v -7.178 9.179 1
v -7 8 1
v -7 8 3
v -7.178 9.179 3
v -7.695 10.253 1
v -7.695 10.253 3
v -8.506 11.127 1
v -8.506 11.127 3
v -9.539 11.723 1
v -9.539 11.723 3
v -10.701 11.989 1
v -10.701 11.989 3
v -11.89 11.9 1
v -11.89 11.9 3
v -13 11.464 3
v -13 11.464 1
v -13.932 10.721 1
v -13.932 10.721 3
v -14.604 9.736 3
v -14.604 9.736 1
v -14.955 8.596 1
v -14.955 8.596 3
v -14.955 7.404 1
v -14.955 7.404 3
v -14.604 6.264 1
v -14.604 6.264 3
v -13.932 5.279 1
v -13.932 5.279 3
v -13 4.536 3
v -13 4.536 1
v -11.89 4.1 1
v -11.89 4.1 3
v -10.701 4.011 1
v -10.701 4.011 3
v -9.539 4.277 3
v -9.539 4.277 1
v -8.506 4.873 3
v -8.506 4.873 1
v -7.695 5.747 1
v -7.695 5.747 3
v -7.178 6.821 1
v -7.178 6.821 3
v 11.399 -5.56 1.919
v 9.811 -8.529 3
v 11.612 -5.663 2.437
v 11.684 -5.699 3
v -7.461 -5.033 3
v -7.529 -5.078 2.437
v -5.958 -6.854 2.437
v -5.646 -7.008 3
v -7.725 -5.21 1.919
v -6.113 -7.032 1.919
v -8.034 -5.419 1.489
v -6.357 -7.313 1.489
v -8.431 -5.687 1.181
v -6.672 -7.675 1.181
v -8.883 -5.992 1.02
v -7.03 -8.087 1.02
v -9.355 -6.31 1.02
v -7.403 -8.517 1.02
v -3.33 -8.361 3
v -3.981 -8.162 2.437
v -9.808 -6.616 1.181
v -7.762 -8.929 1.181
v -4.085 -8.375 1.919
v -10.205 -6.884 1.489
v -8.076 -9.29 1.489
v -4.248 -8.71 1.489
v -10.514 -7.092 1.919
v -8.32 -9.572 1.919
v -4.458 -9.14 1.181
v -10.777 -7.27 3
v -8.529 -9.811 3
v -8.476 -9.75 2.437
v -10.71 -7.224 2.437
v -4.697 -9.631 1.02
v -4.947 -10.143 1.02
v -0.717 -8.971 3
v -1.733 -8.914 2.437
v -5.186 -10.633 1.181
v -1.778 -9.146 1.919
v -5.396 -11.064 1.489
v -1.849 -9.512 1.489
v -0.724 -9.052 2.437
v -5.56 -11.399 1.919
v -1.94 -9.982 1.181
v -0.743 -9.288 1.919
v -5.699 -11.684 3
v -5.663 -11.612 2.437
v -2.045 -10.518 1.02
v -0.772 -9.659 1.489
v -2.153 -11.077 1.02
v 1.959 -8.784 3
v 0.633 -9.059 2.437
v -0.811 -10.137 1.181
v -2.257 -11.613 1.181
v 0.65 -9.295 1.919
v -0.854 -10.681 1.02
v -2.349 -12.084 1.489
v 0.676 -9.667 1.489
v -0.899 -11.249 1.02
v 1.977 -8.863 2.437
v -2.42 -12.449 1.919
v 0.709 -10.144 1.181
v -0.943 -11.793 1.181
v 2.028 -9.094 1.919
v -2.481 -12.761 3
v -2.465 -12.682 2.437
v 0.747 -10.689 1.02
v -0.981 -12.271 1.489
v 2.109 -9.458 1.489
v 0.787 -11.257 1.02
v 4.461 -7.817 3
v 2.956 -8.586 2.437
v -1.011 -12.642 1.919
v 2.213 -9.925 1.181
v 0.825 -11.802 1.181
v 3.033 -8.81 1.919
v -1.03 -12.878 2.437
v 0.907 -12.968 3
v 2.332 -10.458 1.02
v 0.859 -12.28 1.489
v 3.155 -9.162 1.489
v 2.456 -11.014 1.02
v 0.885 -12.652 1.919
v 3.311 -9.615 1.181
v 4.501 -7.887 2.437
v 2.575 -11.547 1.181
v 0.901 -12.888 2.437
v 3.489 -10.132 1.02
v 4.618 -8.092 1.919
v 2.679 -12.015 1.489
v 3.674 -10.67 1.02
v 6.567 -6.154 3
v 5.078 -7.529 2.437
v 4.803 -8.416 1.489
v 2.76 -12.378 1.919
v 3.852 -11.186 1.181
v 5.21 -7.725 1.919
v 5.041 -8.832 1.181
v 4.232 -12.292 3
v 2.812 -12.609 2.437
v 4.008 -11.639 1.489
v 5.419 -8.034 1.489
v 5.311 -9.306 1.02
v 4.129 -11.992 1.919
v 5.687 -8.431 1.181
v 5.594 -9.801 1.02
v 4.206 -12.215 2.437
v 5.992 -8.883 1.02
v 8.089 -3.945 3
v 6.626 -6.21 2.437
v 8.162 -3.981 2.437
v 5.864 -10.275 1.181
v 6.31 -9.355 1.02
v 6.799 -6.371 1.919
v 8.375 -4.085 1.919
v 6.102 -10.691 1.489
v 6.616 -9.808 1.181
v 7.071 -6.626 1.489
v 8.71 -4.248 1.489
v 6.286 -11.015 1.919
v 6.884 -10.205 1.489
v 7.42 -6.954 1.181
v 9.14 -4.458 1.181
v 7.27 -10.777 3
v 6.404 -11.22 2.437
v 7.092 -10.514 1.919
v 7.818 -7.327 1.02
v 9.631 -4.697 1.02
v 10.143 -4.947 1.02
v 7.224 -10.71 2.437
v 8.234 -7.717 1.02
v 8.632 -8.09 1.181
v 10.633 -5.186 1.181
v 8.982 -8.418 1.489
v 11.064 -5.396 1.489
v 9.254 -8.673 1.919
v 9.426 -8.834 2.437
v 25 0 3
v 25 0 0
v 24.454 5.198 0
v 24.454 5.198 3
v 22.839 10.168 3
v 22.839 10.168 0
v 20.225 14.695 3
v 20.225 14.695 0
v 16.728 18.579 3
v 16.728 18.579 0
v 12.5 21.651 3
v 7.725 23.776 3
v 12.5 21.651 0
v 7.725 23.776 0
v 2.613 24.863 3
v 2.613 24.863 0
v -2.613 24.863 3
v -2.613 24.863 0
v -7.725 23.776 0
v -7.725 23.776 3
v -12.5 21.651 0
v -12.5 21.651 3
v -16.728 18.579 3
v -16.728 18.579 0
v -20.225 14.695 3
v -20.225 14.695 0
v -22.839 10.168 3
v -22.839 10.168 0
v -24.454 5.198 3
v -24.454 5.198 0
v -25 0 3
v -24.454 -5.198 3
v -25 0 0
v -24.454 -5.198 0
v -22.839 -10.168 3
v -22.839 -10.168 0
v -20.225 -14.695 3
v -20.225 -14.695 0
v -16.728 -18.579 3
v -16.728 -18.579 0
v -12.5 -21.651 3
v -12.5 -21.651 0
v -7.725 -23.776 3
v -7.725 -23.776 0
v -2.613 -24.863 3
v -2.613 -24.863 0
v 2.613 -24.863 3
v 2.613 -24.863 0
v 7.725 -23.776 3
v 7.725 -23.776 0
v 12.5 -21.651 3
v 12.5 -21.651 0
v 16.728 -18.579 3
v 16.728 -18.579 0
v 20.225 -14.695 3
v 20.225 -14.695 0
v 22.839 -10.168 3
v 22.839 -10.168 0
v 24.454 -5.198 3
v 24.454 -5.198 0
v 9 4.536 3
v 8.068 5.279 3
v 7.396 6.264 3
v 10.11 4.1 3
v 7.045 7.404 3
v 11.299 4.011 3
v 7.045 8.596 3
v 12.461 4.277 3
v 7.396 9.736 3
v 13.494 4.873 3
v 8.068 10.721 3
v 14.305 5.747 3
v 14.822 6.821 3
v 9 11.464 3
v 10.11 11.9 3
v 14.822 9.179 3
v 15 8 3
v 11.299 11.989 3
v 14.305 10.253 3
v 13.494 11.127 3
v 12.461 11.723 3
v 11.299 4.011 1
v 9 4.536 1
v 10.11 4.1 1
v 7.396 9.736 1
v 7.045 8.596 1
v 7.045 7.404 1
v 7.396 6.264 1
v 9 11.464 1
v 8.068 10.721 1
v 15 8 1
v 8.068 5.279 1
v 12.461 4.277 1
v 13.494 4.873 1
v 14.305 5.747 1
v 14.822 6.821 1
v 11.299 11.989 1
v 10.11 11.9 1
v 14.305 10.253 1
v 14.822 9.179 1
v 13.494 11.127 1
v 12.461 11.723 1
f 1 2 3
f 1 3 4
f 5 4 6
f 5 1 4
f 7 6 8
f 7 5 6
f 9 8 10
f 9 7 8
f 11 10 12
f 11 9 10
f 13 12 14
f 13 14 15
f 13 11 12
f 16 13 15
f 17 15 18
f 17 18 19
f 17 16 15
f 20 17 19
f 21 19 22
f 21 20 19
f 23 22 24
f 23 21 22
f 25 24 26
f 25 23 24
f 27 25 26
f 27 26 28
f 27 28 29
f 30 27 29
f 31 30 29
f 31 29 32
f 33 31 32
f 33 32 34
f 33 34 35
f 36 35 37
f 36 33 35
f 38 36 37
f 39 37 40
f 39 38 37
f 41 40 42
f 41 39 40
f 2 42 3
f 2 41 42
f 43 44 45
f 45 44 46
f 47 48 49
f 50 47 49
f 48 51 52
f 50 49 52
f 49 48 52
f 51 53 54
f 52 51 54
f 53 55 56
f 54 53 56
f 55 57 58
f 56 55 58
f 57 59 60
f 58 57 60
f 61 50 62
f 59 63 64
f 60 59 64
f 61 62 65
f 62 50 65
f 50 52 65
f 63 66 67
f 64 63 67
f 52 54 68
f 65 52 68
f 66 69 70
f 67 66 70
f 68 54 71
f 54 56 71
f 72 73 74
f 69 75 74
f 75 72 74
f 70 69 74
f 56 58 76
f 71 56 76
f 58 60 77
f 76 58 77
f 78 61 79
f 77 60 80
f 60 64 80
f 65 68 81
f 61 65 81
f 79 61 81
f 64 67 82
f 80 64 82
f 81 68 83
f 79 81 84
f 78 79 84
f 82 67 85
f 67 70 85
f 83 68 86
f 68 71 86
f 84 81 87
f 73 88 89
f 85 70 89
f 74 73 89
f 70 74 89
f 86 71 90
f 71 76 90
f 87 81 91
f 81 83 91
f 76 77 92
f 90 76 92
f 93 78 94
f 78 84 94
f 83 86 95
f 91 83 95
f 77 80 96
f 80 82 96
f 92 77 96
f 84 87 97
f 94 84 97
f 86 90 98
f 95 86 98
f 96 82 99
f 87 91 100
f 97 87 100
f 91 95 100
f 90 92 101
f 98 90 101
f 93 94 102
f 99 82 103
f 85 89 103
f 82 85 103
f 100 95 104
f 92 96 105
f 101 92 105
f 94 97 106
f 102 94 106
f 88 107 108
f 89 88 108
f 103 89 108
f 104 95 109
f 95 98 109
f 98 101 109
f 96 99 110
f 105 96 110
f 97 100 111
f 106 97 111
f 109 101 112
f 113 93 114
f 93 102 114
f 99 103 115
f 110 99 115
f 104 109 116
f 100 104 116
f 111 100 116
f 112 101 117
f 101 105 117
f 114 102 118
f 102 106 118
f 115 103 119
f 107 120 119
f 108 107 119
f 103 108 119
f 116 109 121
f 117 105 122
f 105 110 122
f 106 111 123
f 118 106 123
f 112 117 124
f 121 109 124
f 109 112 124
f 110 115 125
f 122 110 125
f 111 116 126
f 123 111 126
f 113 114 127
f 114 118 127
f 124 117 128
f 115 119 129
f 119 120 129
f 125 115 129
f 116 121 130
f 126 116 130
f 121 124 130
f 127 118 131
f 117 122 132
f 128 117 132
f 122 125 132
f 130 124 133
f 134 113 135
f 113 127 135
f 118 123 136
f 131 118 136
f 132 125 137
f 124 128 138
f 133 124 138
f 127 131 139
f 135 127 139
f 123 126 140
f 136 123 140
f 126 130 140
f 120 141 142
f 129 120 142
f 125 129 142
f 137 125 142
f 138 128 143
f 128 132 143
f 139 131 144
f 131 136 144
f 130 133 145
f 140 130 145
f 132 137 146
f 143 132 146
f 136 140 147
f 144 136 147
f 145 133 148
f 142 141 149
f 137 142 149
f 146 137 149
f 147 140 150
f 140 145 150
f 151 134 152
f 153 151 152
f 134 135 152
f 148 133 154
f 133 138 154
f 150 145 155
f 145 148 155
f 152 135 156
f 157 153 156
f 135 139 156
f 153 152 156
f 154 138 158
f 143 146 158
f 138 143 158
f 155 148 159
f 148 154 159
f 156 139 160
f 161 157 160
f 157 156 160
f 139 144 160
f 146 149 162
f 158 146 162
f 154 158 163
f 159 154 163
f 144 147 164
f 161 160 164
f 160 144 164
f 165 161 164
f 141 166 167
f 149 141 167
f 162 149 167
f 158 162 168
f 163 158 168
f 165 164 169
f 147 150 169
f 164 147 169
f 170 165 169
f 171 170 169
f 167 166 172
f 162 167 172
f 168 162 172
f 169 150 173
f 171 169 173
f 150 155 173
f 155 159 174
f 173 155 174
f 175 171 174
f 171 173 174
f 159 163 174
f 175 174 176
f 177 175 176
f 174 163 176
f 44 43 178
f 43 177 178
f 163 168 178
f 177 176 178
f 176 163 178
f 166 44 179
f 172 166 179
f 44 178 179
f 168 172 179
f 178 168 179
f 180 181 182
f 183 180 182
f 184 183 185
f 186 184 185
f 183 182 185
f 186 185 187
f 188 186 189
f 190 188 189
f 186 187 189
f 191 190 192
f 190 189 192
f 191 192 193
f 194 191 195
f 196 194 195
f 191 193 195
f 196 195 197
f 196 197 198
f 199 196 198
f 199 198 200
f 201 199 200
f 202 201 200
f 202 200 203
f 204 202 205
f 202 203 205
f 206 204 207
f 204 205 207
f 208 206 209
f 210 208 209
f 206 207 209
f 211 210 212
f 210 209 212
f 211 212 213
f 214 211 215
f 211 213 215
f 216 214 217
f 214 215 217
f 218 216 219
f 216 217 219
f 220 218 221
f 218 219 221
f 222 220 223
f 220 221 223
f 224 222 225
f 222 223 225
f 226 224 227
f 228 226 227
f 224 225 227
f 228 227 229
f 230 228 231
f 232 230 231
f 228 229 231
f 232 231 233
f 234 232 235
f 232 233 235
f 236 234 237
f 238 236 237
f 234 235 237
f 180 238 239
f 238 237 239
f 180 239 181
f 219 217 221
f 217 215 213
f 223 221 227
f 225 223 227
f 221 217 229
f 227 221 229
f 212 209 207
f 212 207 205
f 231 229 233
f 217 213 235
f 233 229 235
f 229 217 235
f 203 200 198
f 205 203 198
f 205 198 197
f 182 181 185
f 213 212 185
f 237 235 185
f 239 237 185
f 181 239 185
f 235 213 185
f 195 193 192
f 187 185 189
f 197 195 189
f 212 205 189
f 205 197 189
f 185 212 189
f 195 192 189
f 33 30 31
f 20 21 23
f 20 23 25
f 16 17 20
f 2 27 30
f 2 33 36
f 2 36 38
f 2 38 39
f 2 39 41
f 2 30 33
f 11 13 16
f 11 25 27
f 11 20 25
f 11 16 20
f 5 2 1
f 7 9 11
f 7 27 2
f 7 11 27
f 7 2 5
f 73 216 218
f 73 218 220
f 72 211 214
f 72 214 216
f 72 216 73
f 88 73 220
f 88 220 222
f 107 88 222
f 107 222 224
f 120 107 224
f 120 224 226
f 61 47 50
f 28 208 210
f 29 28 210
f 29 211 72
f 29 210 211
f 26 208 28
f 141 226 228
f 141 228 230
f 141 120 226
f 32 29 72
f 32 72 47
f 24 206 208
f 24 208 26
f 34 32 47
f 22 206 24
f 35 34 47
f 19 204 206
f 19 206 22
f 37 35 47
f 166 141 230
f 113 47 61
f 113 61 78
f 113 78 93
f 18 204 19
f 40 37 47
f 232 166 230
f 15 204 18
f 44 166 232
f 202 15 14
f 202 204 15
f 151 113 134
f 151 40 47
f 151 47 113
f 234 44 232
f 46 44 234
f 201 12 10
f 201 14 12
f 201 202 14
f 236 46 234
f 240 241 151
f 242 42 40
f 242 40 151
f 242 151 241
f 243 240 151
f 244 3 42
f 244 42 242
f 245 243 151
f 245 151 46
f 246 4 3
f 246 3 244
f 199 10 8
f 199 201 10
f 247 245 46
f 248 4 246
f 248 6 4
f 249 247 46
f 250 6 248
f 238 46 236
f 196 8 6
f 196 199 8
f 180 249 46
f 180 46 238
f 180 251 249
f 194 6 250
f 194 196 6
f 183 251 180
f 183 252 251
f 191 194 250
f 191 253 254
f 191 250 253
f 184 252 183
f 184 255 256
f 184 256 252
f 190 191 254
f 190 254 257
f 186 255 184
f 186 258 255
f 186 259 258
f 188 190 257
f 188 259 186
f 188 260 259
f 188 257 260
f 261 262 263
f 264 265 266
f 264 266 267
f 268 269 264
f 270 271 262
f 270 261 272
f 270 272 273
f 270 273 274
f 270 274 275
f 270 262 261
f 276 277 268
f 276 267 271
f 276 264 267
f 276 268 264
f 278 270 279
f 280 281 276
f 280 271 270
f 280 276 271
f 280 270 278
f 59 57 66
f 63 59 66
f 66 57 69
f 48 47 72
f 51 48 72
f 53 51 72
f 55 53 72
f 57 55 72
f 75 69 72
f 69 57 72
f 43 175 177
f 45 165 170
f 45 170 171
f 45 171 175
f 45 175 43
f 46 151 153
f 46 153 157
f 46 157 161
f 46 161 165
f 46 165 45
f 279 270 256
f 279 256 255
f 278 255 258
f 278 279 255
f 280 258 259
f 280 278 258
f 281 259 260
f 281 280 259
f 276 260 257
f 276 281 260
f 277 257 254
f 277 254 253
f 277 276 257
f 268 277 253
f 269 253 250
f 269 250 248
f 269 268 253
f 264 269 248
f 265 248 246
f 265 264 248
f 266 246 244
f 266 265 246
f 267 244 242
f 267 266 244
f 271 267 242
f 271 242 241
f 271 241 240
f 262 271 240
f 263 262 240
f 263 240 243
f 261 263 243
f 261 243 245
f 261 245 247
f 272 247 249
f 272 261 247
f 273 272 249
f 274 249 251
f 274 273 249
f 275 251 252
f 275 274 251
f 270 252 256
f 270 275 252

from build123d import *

# Parameters (mm, degrees)
CYLINDER001_R         = 4
CYLINDER001_DEPTH     = 2
CYLINDER002_R         = 4
CYLINDER002_DEPTH     = 2
TORUS_R               = 2
TORUS_ANGLE           = 120
TORUS_PLACEMENT_ANGLE = 146
CYLINDER_R            = 25
CYLINDER_DEPTH        = 3


with BuildPart() as ull1:
    # Cylinder001 → Cylinder001 (new body)
    with BuildSketch(Plane(origin=(11, 8, 1), x_dir=(1, 0, 0), z_dir=(0, 0, 1))):
        Circle(CYLINDER001_R)
    extrude(amount=CYLINDER001_DEPTH)


with BuildPart() as ull2:
    # Cylinder002 → Cylinder002 (new body)
    with BuildSketch(Plane(origin=(-11, 8, 1), x_dir=(1, 0, 0), z_dir=(0, 0, 1))):
        Circle(CYLINDER002_R)
    extrude(amount=CYLINDER002_DEPTH)


with BuildPart() as boca:
    # Torus → Torus (revolve)
    with BuildSketch(Plane.XZ):
        with Locations((11, 0)):
            Circle(TORUS_R)
    revolve(axis=Axis((0, 0, 0), (0, 0, 1)), revolution_arc=TORUS_ANGLE)


with BuildPart() as boca_1:
    # Torus placement: moved
    add(boca.part.moved(Location((0, 0, 3))).rotate(Axis((0, 0, 3), (0, 0, -1)), TORUS_PLACEMENT_ANGLE))


with BuildPart() as cut002:
    # Cylinder → Cylinder (new body)
    with BuildSketch(Plane.XY):
        Circle(CYLINDER_R)
    extrude(amount=CYLINDER_DEPTH)

    # Cut: cut boca
    add(boca_1.part, mode=Mode.SUBTRACT)

    # Cut001: cut ull2
    add(ull2.part, mode=Mode.SUBTRACT)

    # Cut002: cut ull1
    add(ull1.part, mode=Mode.SUBTRACT)


solid = cut002.part
